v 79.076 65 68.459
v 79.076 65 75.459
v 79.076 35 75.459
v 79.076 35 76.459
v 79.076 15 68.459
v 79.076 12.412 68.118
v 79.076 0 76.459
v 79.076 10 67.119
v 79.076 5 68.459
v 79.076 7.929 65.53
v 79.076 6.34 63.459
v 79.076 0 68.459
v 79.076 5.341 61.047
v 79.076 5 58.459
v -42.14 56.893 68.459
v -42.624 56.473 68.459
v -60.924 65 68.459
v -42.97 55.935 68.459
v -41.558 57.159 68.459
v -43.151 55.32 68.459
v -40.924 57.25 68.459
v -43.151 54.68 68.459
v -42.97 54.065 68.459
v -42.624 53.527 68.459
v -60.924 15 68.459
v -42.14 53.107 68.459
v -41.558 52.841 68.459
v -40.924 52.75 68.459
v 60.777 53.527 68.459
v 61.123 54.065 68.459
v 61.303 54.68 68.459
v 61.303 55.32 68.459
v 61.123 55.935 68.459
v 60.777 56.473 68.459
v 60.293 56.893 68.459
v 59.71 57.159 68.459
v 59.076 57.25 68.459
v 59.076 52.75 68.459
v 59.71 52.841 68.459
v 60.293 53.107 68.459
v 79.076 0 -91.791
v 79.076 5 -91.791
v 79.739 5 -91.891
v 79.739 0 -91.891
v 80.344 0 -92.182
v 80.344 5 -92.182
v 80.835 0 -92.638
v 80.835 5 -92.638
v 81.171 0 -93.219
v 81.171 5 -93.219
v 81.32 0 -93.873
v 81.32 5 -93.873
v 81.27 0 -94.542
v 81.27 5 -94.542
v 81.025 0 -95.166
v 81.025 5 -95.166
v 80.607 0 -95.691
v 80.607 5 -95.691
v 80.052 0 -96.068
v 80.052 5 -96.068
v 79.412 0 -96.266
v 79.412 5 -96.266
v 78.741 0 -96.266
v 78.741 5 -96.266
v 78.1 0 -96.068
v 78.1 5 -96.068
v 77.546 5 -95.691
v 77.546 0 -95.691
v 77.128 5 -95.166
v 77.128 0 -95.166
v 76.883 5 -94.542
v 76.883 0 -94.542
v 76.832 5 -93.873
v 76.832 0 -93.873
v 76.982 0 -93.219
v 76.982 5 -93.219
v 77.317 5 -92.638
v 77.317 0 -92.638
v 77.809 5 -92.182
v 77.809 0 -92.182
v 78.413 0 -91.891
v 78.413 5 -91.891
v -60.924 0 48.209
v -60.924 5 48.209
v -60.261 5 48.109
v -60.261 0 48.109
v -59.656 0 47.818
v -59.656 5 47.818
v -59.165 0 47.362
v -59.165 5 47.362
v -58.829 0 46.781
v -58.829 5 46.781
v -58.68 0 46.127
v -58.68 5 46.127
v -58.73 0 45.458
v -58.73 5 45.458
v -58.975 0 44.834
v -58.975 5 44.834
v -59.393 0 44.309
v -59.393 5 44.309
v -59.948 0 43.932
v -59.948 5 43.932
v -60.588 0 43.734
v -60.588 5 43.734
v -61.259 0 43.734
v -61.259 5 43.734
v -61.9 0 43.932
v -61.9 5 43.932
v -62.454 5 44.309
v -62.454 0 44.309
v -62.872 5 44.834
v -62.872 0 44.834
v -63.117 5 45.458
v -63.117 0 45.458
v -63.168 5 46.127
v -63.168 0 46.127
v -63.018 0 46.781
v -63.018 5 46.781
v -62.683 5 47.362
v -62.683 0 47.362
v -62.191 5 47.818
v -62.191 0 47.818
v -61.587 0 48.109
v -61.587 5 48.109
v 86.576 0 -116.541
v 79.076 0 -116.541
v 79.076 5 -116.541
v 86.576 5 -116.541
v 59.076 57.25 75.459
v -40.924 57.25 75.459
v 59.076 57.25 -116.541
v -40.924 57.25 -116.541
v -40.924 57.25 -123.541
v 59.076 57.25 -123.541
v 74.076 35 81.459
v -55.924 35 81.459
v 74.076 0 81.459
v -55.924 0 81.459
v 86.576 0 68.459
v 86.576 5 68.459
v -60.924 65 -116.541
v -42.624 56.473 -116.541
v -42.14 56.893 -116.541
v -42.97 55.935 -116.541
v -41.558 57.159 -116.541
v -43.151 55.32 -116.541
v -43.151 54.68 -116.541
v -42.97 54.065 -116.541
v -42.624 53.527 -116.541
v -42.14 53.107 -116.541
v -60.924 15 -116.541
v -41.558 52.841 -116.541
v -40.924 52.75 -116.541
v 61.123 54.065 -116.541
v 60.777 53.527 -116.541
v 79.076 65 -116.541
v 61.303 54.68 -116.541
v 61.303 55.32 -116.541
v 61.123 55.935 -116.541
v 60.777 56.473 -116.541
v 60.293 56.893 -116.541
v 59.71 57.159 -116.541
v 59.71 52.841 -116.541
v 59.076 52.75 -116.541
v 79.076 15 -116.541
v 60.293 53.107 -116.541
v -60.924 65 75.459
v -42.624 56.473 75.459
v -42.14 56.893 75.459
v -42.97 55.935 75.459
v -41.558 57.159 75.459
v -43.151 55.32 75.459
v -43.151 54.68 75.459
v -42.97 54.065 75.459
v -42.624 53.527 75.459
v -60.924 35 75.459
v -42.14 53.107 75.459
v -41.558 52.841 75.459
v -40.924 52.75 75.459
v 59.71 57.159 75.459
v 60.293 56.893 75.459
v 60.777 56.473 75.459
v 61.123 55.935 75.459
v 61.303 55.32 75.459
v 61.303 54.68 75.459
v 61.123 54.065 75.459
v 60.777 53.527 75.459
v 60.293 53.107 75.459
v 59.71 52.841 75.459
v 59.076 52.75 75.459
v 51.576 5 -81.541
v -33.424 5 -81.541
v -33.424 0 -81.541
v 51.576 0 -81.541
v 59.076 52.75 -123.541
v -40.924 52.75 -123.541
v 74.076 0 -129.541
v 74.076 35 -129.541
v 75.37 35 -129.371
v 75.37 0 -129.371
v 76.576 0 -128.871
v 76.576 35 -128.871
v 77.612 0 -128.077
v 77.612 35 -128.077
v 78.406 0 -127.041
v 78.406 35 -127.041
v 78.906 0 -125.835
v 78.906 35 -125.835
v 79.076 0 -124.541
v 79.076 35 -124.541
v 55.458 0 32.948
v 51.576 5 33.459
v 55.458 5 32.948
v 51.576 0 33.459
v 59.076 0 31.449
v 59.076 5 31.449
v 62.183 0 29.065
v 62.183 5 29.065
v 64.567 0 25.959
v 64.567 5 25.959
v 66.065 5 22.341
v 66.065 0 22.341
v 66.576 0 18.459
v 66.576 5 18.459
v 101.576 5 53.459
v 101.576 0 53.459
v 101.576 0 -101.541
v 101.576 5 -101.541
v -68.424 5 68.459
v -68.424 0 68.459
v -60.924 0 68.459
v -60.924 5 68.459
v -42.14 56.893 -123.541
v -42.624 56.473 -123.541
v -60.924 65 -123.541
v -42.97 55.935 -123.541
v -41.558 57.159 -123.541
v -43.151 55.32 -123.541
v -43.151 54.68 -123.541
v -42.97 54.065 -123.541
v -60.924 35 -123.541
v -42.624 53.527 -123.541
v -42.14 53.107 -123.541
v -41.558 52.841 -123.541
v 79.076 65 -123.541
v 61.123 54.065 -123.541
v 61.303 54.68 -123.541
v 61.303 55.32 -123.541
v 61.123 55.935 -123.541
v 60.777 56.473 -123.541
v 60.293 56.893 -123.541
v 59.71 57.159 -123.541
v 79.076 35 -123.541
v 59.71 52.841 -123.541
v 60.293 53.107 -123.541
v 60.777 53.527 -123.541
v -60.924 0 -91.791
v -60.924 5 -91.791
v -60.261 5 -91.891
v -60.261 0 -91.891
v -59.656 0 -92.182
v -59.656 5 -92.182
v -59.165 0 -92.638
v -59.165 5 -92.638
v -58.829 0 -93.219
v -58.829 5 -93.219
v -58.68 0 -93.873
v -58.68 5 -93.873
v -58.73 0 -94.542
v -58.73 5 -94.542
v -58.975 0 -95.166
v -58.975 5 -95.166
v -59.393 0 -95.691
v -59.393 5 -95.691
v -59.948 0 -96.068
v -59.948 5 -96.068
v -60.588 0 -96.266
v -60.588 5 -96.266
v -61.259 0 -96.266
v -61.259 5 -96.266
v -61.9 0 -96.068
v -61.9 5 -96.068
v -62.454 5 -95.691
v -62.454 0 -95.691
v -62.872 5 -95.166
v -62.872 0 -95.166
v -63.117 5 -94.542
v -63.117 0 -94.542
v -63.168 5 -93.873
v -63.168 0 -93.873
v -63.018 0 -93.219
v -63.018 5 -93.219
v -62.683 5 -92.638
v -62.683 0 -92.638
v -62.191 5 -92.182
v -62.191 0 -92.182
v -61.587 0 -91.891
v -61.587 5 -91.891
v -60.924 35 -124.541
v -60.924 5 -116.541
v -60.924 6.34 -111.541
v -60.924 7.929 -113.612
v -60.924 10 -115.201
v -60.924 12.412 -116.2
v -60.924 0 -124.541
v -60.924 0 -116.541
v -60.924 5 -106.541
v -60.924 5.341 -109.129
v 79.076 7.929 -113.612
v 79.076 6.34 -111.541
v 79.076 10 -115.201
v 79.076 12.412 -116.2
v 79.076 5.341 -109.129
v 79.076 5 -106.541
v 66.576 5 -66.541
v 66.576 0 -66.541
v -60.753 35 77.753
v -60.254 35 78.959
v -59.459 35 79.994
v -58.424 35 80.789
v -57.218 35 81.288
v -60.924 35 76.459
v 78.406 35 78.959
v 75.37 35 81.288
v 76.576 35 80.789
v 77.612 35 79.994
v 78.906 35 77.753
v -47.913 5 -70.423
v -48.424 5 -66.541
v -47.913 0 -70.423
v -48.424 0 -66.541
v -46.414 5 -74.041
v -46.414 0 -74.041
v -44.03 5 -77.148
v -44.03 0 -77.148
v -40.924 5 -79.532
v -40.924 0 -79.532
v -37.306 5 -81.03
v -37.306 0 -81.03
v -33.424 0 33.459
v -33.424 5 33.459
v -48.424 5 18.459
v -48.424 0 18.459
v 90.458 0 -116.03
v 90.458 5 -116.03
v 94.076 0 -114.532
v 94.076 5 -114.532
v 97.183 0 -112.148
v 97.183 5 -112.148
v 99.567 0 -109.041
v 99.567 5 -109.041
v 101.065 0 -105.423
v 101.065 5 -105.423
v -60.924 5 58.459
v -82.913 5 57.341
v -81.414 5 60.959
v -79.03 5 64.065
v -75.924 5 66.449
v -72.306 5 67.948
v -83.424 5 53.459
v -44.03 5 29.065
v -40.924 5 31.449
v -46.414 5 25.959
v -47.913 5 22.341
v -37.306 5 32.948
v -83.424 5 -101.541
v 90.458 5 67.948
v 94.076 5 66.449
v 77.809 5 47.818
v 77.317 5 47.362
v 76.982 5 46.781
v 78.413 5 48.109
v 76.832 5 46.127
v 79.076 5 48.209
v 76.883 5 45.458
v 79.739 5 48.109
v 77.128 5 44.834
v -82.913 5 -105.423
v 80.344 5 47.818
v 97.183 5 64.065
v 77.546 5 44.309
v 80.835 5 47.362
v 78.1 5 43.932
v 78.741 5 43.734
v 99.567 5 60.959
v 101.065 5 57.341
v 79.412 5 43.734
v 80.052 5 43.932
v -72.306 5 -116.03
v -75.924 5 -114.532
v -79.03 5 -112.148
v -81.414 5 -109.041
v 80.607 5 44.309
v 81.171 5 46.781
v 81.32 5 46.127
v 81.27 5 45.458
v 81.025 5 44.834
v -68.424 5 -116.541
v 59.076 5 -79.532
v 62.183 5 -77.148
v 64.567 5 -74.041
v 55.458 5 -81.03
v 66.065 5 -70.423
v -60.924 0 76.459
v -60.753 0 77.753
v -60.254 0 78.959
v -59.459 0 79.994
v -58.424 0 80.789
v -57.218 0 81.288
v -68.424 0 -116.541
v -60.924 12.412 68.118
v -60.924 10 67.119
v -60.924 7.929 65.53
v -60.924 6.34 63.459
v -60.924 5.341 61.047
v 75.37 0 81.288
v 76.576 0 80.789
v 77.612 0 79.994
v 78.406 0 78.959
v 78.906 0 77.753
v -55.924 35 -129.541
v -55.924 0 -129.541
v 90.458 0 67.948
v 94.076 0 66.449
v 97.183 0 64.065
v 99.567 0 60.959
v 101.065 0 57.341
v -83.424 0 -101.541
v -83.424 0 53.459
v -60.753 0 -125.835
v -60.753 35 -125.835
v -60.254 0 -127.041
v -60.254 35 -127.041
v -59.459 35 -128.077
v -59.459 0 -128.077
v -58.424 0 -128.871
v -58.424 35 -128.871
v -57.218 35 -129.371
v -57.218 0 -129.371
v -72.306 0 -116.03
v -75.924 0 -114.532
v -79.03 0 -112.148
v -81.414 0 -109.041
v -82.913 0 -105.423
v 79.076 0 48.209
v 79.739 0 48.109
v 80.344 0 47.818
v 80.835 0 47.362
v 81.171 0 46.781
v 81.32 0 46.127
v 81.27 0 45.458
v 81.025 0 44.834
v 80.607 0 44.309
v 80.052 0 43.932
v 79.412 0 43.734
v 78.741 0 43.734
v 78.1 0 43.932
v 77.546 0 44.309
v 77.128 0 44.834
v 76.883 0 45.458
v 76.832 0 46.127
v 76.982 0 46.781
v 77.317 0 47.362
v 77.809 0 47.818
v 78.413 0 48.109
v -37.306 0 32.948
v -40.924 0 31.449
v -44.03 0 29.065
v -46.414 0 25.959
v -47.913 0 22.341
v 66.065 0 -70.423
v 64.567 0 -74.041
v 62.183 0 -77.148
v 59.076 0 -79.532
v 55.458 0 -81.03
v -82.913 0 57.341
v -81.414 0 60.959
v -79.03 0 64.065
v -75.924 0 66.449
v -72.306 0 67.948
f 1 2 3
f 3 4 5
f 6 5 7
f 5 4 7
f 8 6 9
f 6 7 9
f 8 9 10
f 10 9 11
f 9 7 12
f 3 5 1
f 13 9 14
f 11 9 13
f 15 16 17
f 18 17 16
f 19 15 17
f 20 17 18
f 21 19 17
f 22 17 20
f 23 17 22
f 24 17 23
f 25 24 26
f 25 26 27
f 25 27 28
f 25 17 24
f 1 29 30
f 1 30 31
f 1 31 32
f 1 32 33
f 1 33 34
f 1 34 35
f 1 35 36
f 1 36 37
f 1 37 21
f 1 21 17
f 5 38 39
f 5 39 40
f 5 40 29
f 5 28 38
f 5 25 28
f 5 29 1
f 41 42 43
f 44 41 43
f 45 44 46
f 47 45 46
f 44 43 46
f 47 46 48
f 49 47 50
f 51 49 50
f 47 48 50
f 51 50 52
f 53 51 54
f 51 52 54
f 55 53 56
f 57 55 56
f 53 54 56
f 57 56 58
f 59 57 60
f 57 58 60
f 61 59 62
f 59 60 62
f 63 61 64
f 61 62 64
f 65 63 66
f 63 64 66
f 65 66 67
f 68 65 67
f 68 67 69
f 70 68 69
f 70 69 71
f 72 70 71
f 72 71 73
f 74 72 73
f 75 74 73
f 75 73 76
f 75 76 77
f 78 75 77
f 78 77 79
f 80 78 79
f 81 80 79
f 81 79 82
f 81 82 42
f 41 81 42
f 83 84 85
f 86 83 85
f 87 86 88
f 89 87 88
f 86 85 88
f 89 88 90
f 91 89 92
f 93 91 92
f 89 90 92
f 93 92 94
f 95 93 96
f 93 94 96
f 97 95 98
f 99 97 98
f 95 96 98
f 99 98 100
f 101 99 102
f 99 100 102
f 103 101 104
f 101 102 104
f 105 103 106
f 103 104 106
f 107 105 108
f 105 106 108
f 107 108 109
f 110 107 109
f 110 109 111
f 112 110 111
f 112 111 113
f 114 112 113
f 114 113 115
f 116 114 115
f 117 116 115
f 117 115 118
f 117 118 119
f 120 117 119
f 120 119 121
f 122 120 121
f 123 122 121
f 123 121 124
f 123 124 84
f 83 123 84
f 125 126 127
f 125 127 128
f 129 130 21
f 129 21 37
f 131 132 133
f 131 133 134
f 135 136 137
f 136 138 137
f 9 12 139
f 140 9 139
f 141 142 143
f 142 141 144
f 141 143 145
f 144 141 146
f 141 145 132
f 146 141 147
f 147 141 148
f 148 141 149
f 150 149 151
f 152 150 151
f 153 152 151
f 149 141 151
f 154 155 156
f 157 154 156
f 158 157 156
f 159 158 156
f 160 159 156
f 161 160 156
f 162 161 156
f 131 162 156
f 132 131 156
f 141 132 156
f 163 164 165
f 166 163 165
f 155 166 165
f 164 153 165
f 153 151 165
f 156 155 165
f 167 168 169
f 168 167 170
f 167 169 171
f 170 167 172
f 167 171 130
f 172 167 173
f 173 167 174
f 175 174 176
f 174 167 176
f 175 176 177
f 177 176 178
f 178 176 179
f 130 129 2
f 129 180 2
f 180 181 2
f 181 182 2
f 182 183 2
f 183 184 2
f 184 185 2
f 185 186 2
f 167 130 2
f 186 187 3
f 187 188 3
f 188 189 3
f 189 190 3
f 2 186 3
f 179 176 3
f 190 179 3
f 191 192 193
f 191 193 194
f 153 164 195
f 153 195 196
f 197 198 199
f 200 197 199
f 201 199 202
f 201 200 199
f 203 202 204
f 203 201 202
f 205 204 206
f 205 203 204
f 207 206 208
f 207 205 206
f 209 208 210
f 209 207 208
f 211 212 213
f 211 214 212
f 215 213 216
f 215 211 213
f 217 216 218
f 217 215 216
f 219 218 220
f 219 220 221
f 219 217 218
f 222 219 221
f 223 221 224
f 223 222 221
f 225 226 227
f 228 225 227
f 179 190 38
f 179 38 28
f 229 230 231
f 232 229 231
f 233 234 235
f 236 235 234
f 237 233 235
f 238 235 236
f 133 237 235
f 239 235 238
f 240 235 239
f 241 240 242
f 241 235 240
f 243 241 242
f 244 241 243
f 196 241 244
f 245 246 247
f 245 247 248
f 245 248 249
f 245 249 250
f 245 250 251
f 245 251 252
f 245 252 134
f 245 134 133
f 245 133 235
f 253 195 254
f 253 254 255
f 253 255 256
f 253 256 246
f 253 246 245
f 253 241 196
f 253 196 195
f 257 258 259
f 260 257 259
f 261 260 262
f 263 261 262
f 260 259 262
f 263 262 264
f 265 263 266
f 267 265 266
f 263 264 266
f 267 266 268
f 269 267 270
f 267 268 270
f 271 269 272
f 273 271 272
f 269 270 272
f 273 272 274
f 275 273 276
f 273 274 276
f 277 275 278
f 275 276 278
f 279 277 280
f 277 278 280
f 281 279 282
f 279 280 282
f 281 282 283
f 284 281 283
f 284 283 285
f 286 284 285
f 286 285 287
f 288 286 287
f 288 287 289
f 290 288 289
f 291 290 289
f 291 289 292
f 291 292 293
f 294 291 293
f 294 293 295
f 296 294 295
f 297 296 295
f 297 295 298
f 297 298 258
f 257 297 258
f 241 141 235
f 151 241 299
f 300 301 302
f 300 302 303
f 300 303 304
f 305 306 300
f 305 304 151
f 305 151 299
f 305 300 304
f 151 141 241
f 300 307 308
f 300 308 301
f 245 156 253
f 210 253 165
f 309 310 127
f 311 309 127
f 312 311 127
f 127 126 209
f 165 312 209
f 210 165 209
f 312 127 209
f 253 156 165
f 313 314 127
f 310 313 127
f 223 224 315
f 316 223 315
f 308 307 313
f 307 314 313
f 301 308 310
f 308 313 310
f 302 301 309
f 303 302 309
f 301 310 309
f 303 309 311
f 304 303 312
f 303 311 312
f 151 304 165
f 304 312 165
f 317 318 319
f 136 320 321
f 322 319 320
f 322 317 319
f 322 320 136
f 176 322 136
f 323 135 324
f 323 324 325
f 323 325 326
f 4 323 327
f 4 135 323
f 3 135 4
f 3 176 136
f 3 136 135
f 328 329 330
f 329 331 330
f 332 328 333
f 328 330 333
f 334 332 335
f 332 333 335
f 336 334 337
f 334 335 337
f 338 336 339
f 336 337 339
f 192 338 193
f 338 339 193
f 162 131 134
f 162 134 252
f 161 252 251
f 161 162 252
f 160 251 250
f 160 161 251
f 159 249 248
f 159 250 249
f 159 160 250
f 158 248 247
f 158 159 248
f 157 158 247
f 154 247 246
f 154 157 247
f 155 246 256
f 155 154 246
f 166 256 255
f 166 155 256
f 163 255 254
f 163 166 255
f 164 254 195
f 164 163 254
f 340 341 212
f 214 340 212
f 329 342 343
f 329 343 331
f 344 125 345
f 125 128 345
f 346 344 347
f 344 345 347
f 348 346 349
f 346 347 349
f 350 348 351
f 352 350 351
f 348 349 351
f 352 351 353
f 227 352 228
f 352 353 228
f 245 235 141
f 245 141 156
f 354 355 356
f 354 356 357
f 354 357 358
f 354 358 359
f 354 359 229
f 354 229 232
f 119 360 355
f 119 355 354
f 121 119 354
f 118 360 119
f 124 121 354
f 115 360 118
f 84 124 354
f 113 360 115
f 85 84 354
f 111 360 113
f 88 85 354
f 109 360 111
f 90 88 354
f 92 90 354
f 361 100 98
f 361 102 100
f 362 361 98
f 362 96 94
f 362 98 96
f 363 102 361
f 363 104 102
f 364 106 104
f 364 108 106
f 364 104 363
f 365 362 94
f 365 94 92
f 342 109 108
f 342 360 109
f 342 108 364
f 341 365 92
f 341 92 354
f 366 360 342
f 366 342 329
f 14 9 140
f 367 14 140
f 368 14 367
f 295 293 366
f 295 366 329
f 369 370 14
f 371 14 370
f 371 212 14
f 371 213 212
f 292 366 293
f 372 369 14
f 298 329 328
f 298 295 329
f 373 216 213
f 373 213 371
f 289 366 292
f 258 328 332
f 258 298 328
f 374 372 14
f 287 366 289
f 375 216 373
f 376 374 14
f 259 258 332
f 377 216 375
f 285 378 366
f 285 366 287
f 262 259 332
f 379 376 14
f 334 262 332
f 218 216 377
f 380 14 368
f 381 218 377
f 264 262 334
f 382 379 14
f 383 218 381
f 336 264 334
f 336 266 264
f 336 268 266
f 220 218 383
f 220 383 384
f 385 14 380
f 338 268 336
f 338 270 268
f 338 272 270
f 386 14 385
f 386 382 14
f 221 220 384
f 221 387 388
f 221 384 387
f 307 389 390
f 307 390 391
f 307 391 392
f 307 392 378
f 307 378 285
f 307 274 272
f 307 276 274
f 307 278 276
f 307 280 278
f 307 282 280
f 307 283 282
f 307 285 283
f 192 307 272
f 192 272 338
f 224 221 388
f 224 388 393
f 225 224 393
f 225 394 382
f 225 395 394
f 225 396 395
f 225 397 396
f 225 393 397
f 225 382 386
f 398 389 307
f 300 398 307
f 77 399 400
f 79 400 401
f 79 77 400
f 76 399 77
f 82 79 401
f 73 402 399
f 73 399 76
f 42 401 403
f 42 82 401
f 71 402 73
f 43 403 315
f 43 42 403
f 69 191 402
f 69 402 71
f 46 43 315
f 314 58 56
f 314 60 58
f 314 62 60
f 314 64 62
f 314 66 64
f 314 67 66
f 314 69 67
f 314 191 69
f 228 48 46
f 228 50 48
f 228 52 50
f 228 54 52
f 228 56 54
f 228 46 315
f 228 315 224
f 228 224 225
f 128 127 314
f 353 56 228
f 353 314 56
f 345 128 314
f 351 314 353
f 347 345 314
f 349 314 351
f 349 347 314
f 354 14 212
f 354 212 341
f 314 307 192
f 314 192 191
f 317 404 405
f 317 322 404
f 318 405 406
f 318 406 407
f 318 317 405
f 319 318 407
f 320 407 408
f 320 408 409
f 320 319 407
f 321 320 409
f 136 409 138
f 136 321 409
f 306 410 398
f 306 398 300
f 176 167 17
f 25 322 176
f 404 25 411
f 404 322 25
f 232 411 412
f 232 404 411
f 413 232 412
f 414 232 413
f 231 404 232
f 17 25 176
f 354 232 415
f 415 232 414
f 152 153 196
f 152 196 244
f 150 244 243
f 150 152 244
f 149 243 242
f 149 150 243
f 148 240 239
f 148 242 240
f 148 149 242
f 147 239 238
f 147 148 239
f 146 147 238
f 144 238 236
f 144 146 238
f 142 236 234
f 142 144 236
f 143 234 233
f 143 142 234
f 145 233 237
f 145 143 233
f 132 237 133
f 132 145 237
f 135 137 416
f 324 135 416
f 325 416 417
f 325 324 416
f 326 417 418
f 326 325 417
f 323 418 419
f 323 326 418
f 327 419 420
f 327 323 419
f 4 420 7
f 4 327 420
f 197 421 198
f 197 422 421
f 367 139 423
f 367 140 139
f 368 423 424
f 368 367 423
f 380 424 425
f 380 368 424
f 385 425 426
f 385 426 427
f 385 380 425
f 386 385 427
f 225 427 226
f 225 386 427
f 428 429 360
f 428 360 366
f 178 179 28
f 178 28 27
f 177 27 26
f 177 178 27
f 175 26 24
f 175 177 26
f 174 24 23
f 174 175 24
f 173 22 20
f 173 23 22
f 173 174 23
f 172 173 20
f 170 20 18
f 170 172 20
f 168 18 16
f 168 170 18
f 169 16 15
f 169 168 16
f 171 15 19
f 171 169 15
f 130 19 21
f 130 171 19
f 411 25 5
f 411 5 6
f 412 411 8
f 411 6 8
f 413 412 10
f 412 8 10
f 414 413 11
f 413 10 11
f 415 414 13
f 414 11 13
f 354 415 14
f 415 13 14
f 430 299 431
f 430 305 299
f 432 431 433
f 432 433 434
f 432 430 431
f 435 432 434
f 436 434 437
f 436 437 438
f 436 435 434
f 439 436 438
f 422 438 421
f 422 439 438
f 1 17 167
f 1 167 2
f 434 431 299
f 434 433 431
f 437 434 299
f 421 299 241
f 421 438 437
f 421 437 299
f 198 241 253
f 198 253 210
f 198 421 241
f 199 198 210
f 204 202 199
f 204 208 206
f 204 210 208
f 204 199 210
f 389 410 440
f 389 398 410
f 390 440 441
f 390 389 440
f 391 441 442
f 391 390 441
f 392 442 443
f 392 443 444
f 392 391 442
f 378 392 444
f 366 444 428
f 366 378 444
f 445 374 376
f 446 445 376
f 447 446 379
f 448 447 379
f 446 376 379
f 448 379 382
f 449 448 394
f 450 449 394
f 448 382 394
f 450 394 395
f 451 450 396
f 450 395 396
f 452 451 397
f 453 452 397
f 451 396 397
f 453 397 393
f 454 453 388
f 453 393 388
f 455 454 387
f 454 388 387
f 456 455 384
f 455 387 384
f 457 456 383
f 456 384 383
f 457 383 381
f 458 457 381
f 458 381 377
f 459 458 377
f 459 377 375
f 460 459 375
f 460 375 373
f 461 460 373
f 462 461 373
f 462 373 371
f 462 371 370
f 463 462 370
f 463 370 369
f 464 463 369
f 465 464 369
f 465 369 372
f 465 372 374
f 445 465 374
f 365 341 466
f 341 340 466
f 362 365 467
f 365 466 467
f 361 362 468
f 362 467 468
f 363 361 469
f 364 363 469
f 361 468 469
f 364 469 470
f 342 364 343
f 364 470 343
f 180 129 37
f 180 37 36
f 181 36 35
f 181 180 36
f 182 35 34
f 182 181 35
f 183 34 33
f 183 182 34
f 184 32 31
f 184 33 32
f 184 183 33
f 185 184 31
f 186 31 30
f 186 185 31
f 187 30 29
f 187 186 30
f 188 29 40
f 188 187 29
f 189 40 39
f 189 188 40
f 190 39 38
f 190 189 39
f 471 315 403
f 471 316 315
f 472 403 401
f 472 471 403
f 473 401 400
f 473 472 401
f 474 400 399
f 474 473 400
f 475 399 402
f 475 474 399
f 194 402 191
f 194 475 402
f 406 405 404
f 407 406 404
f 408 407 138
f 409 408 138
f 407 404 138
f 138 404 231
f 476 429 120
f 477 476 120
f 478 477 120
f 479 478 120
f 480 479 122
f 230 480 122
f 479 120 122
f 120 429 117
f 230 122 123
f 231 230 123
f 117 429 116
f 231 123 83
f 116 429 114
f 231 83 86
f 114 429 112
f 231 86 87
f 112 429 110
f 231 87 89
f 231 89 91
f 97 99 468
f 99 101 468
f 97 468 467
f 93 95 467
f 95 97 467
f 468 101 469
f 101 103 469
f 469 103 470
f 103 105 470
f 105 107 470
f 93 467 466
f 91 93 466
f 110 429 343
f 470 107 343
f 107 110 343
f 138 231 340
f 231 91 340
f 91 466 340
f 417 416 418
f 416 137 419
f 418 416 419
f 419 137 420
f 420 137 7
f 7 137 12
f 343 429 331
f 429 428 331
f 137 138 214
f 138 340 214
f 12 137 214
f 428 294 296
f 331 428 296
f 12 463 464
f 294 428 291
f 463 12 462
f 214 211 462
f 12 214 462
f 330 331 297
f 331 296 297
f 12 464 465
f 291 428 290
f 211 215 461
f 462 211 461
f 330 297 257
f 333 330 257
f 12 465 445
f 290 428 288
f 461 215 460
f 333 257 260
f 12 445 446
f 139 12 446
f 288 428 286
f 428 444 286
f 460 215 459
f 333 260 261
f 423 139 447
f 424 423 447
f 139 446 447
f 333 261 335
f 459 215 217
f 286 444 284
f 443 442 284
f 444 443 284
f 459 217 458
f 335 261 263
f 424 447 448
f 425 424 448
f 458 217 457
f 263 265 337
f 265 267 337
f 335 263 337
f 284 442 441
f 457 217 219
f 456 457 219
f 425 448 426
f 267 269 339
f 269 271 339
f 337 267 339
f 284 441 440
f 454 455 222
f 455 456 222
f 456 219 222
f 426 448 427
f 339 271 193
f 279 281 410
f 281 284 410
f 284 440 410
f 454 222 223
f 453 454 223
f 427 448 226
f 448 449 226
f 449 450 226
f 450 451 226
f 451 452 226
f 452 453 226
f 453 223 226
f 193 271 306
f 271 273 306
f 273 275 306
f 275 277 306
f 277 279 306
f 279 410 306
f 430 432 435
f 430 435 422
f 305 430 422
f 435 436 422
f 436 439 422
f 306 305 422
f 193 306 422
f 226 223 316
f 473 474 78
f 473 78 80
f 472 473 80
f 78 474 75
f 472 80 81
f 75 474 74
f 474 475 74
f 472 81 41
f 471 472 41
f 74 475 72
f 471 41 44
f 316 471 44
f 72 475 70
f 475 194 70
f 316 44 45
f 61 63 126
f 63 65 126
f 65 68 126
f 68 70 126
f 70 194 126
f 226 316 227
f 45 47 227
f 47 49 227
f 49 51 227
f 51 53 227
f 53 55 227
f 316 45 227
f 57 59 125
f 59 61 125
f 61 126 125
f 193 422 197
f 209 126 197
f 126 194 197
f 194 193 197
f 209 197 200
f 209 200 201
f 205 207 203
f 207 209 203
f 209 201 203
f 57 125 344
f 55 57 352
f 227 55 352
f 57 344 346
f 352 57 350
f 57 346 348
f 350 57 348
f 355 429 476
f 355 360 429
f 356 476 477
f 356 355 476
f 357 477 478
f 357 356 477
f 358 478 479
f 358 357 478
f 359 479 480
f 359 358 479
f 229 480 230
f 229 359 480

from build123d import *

# Parameters (mm, degrees)
SKETCH1_W           = 185
SKETCH1_H           = 185
SKETCH1_W_2         = 140
SKETCH1_H_2         = 13
BOSS_EXTRUDE1_DEPTH = 5
SKETCH2_W           = 140
SKETCH2_H           = 13
BOSS_EXTRUDE2_DEPTH = 30
SKETCH4_W           = 140
SKETCH4_H           = 7
BOSS_EXTRUDE3_DEPTH = 30
CUT_EXTRUDE1_DEPTH  = 1000
SKETCH6_W           = 115
SKETCH6_H           = 115
CUT_EXTRUDE2_DEPTH  = 1000
SKETCH7_R           = 2.25
CUT_EXTRUDE3_DEPTH  = 1000
FILLET1_R           = 15
FILLET2_R           = 5
FILLET3_R           = 10


with BuildPart() as part:
    # Sketch1 → Boss-Extrude1 (new body)
    with BuildSketch(Plane(origin=(0, 0, 0), x_dir=(1, 0, 0), z_dir=(0, 1, 0))):
        with Locations((9.076200418, 24.041155145)):
            Rectangle(SKETCH1_W, SKETCH1_H)
        with Locations((9.076200418, -74.958844855)):
            Rectangle(SKETCH1_W_2, SKETCH1_H_2)
        with Locations((9.076200418, 123.041155145)):
            Rectangle(SKETCH1_W_2, SKETCH1_H_2)
    extrude(amount=BOSS_EXTRUDE1_DEPTH)

    # Sketch2 → Boss-Extrude2 (add)
    with BuildSketch(Plane(origin=(0, 5, 0), x_dir=(1, 0, 0), z_dir=(0, 1, 0))):
        with Locations((9.076200418, 123.041155145)):
            Rectangle(SKETCH2_W, SKETCH2_H)
        with Locations((9.076200418, -74.958844855)):
            Rectangle(SKETCH2_W, SKETCH2_H)
    extrude(amount=BOSS_EXTRUDE2_DEPTH)

    # Sketch4 → Boss-Extrude3 (add)
    with BuildSketch(Plane(origin=(0, 35, 0), x_dir=(1, 0, 0), z_dir=(0, 1, 0))):
        with Locations((9.076200418, 120.041155145)):
            Rectangle(SKETCH4_W, SKETCH4_H)
        with Locations((9.076200418, -71.958844855)):
            Rectangle(SKETCH4_W, SKETCH4_H)
    extrude(amount=BOSS_EXTRUDE3_DEPTH)

    # Sketch5 → Cut-Extrude1 (cut)
    with BuildSketch(Plane.XY.offset(75.458844855)):
        with BuildLine():
            Line((-40.923799582, 57.25), (59.076200418, 57.25))
            ThreePointArc((59.076200418, 57.25), (61.326200418, 55), (59.076200418, 52.75))
            Line((59.076200418, 52.75), (-40.923799582, 52.75))
            ThreePointArc((-40.923799582, 52.75), (-43.173799582, 55), (-40.923799582, 57.25))
        make_face()
    extrude(amount=-CUT_EXTRUDE1_DEPTH, mode=Mode.SUBTRACT)

    # Sketch6 → Cut-Extrude2 (cut)
    with BuildSketch(Plane(origin=(0, 5, 0), x_dir=(1, 0, 0), z_dir=(0, 1, 0))):
        with Locations((9.076200418, 24.041155145)):
            Rectangle(SKETCH6_W, SKETCH6_H)
    extrude(amount=-CUT_EXTRUDE2_DEPTH, mode=Mode.SUBTRACT)

    # Sketch7 → Cut-Extrude3 (cut)
    with BuildSketch(Plane(origin=(0, 5, 0), x_dir=(1, 0, 0), z_dir=(0, 1, 0))):
        with Locations(Location((-60.923799582, 94.041155145, 0), (0, 0, 270))):
            Circle(SKETCH7_R)
        with Locations(Location((79.076200418, 94.041155145, 0), (0, 0, 270))):
            Circle(SKETCH7_R)
        with Locations(Location((79.076200418, -45.958844855, 0), (0, 0, 270))):
            Circle(SKETCH7_R)
        with Locations(Location((-60.923799582, -45.958844855, 0), (0, 0, 270))):
            Circle(SKETCH7_R)
    extrude(amount=-CUT_EXTRUDE3_DEPTH, mode=Mode.SUBTRACT)

    # Fillet1
    fillet1_edges = [part.edges().sort_by_distance(p)[0] for p in [
        (-48.423799582, 2.5, 33.458844855),
        (-48.423799582, 2.5, -81.541155145),
        (66.576200418, 2.5, -81.541155145),
        (66.576200418, 2.5, 33.458844855),
        (101.576200418, 2.5, 68.458844855),
        (-83.423799582, 2.5, 68.458844855),
        (-83.423799582, 2.5, -116.541155145),
        (101.576200418, 2.5, -116.541155145),
    ]]
    fillet(fillet1_edges, radius=FILLET1_R)

    # Fillet2
    fillet2_edges = [part.edges().sort_by_distance(p)[0] for p in [
        (79.076200418, 17.5, 81.458844855),
        (-60.923799582, 17.5, 81.458844855),
        (-60.923799582, 17.5, -129.541155145),
        (79.076200418, 17.5, -129.541155145),
    ]]
    fillet(fillet2_edges, radius=FILLET2_R)

    # Fillet3
    fillet3_edges = [part.edges().sort_by_distance(p)[0] for p in [
        (9.076200418, 5, -116.541155145),
        (9.076200418, 5, 68.458844855),
    ]]
    fillet(fillet3_edges, radius=FILLET3_R)


solid = part.part
